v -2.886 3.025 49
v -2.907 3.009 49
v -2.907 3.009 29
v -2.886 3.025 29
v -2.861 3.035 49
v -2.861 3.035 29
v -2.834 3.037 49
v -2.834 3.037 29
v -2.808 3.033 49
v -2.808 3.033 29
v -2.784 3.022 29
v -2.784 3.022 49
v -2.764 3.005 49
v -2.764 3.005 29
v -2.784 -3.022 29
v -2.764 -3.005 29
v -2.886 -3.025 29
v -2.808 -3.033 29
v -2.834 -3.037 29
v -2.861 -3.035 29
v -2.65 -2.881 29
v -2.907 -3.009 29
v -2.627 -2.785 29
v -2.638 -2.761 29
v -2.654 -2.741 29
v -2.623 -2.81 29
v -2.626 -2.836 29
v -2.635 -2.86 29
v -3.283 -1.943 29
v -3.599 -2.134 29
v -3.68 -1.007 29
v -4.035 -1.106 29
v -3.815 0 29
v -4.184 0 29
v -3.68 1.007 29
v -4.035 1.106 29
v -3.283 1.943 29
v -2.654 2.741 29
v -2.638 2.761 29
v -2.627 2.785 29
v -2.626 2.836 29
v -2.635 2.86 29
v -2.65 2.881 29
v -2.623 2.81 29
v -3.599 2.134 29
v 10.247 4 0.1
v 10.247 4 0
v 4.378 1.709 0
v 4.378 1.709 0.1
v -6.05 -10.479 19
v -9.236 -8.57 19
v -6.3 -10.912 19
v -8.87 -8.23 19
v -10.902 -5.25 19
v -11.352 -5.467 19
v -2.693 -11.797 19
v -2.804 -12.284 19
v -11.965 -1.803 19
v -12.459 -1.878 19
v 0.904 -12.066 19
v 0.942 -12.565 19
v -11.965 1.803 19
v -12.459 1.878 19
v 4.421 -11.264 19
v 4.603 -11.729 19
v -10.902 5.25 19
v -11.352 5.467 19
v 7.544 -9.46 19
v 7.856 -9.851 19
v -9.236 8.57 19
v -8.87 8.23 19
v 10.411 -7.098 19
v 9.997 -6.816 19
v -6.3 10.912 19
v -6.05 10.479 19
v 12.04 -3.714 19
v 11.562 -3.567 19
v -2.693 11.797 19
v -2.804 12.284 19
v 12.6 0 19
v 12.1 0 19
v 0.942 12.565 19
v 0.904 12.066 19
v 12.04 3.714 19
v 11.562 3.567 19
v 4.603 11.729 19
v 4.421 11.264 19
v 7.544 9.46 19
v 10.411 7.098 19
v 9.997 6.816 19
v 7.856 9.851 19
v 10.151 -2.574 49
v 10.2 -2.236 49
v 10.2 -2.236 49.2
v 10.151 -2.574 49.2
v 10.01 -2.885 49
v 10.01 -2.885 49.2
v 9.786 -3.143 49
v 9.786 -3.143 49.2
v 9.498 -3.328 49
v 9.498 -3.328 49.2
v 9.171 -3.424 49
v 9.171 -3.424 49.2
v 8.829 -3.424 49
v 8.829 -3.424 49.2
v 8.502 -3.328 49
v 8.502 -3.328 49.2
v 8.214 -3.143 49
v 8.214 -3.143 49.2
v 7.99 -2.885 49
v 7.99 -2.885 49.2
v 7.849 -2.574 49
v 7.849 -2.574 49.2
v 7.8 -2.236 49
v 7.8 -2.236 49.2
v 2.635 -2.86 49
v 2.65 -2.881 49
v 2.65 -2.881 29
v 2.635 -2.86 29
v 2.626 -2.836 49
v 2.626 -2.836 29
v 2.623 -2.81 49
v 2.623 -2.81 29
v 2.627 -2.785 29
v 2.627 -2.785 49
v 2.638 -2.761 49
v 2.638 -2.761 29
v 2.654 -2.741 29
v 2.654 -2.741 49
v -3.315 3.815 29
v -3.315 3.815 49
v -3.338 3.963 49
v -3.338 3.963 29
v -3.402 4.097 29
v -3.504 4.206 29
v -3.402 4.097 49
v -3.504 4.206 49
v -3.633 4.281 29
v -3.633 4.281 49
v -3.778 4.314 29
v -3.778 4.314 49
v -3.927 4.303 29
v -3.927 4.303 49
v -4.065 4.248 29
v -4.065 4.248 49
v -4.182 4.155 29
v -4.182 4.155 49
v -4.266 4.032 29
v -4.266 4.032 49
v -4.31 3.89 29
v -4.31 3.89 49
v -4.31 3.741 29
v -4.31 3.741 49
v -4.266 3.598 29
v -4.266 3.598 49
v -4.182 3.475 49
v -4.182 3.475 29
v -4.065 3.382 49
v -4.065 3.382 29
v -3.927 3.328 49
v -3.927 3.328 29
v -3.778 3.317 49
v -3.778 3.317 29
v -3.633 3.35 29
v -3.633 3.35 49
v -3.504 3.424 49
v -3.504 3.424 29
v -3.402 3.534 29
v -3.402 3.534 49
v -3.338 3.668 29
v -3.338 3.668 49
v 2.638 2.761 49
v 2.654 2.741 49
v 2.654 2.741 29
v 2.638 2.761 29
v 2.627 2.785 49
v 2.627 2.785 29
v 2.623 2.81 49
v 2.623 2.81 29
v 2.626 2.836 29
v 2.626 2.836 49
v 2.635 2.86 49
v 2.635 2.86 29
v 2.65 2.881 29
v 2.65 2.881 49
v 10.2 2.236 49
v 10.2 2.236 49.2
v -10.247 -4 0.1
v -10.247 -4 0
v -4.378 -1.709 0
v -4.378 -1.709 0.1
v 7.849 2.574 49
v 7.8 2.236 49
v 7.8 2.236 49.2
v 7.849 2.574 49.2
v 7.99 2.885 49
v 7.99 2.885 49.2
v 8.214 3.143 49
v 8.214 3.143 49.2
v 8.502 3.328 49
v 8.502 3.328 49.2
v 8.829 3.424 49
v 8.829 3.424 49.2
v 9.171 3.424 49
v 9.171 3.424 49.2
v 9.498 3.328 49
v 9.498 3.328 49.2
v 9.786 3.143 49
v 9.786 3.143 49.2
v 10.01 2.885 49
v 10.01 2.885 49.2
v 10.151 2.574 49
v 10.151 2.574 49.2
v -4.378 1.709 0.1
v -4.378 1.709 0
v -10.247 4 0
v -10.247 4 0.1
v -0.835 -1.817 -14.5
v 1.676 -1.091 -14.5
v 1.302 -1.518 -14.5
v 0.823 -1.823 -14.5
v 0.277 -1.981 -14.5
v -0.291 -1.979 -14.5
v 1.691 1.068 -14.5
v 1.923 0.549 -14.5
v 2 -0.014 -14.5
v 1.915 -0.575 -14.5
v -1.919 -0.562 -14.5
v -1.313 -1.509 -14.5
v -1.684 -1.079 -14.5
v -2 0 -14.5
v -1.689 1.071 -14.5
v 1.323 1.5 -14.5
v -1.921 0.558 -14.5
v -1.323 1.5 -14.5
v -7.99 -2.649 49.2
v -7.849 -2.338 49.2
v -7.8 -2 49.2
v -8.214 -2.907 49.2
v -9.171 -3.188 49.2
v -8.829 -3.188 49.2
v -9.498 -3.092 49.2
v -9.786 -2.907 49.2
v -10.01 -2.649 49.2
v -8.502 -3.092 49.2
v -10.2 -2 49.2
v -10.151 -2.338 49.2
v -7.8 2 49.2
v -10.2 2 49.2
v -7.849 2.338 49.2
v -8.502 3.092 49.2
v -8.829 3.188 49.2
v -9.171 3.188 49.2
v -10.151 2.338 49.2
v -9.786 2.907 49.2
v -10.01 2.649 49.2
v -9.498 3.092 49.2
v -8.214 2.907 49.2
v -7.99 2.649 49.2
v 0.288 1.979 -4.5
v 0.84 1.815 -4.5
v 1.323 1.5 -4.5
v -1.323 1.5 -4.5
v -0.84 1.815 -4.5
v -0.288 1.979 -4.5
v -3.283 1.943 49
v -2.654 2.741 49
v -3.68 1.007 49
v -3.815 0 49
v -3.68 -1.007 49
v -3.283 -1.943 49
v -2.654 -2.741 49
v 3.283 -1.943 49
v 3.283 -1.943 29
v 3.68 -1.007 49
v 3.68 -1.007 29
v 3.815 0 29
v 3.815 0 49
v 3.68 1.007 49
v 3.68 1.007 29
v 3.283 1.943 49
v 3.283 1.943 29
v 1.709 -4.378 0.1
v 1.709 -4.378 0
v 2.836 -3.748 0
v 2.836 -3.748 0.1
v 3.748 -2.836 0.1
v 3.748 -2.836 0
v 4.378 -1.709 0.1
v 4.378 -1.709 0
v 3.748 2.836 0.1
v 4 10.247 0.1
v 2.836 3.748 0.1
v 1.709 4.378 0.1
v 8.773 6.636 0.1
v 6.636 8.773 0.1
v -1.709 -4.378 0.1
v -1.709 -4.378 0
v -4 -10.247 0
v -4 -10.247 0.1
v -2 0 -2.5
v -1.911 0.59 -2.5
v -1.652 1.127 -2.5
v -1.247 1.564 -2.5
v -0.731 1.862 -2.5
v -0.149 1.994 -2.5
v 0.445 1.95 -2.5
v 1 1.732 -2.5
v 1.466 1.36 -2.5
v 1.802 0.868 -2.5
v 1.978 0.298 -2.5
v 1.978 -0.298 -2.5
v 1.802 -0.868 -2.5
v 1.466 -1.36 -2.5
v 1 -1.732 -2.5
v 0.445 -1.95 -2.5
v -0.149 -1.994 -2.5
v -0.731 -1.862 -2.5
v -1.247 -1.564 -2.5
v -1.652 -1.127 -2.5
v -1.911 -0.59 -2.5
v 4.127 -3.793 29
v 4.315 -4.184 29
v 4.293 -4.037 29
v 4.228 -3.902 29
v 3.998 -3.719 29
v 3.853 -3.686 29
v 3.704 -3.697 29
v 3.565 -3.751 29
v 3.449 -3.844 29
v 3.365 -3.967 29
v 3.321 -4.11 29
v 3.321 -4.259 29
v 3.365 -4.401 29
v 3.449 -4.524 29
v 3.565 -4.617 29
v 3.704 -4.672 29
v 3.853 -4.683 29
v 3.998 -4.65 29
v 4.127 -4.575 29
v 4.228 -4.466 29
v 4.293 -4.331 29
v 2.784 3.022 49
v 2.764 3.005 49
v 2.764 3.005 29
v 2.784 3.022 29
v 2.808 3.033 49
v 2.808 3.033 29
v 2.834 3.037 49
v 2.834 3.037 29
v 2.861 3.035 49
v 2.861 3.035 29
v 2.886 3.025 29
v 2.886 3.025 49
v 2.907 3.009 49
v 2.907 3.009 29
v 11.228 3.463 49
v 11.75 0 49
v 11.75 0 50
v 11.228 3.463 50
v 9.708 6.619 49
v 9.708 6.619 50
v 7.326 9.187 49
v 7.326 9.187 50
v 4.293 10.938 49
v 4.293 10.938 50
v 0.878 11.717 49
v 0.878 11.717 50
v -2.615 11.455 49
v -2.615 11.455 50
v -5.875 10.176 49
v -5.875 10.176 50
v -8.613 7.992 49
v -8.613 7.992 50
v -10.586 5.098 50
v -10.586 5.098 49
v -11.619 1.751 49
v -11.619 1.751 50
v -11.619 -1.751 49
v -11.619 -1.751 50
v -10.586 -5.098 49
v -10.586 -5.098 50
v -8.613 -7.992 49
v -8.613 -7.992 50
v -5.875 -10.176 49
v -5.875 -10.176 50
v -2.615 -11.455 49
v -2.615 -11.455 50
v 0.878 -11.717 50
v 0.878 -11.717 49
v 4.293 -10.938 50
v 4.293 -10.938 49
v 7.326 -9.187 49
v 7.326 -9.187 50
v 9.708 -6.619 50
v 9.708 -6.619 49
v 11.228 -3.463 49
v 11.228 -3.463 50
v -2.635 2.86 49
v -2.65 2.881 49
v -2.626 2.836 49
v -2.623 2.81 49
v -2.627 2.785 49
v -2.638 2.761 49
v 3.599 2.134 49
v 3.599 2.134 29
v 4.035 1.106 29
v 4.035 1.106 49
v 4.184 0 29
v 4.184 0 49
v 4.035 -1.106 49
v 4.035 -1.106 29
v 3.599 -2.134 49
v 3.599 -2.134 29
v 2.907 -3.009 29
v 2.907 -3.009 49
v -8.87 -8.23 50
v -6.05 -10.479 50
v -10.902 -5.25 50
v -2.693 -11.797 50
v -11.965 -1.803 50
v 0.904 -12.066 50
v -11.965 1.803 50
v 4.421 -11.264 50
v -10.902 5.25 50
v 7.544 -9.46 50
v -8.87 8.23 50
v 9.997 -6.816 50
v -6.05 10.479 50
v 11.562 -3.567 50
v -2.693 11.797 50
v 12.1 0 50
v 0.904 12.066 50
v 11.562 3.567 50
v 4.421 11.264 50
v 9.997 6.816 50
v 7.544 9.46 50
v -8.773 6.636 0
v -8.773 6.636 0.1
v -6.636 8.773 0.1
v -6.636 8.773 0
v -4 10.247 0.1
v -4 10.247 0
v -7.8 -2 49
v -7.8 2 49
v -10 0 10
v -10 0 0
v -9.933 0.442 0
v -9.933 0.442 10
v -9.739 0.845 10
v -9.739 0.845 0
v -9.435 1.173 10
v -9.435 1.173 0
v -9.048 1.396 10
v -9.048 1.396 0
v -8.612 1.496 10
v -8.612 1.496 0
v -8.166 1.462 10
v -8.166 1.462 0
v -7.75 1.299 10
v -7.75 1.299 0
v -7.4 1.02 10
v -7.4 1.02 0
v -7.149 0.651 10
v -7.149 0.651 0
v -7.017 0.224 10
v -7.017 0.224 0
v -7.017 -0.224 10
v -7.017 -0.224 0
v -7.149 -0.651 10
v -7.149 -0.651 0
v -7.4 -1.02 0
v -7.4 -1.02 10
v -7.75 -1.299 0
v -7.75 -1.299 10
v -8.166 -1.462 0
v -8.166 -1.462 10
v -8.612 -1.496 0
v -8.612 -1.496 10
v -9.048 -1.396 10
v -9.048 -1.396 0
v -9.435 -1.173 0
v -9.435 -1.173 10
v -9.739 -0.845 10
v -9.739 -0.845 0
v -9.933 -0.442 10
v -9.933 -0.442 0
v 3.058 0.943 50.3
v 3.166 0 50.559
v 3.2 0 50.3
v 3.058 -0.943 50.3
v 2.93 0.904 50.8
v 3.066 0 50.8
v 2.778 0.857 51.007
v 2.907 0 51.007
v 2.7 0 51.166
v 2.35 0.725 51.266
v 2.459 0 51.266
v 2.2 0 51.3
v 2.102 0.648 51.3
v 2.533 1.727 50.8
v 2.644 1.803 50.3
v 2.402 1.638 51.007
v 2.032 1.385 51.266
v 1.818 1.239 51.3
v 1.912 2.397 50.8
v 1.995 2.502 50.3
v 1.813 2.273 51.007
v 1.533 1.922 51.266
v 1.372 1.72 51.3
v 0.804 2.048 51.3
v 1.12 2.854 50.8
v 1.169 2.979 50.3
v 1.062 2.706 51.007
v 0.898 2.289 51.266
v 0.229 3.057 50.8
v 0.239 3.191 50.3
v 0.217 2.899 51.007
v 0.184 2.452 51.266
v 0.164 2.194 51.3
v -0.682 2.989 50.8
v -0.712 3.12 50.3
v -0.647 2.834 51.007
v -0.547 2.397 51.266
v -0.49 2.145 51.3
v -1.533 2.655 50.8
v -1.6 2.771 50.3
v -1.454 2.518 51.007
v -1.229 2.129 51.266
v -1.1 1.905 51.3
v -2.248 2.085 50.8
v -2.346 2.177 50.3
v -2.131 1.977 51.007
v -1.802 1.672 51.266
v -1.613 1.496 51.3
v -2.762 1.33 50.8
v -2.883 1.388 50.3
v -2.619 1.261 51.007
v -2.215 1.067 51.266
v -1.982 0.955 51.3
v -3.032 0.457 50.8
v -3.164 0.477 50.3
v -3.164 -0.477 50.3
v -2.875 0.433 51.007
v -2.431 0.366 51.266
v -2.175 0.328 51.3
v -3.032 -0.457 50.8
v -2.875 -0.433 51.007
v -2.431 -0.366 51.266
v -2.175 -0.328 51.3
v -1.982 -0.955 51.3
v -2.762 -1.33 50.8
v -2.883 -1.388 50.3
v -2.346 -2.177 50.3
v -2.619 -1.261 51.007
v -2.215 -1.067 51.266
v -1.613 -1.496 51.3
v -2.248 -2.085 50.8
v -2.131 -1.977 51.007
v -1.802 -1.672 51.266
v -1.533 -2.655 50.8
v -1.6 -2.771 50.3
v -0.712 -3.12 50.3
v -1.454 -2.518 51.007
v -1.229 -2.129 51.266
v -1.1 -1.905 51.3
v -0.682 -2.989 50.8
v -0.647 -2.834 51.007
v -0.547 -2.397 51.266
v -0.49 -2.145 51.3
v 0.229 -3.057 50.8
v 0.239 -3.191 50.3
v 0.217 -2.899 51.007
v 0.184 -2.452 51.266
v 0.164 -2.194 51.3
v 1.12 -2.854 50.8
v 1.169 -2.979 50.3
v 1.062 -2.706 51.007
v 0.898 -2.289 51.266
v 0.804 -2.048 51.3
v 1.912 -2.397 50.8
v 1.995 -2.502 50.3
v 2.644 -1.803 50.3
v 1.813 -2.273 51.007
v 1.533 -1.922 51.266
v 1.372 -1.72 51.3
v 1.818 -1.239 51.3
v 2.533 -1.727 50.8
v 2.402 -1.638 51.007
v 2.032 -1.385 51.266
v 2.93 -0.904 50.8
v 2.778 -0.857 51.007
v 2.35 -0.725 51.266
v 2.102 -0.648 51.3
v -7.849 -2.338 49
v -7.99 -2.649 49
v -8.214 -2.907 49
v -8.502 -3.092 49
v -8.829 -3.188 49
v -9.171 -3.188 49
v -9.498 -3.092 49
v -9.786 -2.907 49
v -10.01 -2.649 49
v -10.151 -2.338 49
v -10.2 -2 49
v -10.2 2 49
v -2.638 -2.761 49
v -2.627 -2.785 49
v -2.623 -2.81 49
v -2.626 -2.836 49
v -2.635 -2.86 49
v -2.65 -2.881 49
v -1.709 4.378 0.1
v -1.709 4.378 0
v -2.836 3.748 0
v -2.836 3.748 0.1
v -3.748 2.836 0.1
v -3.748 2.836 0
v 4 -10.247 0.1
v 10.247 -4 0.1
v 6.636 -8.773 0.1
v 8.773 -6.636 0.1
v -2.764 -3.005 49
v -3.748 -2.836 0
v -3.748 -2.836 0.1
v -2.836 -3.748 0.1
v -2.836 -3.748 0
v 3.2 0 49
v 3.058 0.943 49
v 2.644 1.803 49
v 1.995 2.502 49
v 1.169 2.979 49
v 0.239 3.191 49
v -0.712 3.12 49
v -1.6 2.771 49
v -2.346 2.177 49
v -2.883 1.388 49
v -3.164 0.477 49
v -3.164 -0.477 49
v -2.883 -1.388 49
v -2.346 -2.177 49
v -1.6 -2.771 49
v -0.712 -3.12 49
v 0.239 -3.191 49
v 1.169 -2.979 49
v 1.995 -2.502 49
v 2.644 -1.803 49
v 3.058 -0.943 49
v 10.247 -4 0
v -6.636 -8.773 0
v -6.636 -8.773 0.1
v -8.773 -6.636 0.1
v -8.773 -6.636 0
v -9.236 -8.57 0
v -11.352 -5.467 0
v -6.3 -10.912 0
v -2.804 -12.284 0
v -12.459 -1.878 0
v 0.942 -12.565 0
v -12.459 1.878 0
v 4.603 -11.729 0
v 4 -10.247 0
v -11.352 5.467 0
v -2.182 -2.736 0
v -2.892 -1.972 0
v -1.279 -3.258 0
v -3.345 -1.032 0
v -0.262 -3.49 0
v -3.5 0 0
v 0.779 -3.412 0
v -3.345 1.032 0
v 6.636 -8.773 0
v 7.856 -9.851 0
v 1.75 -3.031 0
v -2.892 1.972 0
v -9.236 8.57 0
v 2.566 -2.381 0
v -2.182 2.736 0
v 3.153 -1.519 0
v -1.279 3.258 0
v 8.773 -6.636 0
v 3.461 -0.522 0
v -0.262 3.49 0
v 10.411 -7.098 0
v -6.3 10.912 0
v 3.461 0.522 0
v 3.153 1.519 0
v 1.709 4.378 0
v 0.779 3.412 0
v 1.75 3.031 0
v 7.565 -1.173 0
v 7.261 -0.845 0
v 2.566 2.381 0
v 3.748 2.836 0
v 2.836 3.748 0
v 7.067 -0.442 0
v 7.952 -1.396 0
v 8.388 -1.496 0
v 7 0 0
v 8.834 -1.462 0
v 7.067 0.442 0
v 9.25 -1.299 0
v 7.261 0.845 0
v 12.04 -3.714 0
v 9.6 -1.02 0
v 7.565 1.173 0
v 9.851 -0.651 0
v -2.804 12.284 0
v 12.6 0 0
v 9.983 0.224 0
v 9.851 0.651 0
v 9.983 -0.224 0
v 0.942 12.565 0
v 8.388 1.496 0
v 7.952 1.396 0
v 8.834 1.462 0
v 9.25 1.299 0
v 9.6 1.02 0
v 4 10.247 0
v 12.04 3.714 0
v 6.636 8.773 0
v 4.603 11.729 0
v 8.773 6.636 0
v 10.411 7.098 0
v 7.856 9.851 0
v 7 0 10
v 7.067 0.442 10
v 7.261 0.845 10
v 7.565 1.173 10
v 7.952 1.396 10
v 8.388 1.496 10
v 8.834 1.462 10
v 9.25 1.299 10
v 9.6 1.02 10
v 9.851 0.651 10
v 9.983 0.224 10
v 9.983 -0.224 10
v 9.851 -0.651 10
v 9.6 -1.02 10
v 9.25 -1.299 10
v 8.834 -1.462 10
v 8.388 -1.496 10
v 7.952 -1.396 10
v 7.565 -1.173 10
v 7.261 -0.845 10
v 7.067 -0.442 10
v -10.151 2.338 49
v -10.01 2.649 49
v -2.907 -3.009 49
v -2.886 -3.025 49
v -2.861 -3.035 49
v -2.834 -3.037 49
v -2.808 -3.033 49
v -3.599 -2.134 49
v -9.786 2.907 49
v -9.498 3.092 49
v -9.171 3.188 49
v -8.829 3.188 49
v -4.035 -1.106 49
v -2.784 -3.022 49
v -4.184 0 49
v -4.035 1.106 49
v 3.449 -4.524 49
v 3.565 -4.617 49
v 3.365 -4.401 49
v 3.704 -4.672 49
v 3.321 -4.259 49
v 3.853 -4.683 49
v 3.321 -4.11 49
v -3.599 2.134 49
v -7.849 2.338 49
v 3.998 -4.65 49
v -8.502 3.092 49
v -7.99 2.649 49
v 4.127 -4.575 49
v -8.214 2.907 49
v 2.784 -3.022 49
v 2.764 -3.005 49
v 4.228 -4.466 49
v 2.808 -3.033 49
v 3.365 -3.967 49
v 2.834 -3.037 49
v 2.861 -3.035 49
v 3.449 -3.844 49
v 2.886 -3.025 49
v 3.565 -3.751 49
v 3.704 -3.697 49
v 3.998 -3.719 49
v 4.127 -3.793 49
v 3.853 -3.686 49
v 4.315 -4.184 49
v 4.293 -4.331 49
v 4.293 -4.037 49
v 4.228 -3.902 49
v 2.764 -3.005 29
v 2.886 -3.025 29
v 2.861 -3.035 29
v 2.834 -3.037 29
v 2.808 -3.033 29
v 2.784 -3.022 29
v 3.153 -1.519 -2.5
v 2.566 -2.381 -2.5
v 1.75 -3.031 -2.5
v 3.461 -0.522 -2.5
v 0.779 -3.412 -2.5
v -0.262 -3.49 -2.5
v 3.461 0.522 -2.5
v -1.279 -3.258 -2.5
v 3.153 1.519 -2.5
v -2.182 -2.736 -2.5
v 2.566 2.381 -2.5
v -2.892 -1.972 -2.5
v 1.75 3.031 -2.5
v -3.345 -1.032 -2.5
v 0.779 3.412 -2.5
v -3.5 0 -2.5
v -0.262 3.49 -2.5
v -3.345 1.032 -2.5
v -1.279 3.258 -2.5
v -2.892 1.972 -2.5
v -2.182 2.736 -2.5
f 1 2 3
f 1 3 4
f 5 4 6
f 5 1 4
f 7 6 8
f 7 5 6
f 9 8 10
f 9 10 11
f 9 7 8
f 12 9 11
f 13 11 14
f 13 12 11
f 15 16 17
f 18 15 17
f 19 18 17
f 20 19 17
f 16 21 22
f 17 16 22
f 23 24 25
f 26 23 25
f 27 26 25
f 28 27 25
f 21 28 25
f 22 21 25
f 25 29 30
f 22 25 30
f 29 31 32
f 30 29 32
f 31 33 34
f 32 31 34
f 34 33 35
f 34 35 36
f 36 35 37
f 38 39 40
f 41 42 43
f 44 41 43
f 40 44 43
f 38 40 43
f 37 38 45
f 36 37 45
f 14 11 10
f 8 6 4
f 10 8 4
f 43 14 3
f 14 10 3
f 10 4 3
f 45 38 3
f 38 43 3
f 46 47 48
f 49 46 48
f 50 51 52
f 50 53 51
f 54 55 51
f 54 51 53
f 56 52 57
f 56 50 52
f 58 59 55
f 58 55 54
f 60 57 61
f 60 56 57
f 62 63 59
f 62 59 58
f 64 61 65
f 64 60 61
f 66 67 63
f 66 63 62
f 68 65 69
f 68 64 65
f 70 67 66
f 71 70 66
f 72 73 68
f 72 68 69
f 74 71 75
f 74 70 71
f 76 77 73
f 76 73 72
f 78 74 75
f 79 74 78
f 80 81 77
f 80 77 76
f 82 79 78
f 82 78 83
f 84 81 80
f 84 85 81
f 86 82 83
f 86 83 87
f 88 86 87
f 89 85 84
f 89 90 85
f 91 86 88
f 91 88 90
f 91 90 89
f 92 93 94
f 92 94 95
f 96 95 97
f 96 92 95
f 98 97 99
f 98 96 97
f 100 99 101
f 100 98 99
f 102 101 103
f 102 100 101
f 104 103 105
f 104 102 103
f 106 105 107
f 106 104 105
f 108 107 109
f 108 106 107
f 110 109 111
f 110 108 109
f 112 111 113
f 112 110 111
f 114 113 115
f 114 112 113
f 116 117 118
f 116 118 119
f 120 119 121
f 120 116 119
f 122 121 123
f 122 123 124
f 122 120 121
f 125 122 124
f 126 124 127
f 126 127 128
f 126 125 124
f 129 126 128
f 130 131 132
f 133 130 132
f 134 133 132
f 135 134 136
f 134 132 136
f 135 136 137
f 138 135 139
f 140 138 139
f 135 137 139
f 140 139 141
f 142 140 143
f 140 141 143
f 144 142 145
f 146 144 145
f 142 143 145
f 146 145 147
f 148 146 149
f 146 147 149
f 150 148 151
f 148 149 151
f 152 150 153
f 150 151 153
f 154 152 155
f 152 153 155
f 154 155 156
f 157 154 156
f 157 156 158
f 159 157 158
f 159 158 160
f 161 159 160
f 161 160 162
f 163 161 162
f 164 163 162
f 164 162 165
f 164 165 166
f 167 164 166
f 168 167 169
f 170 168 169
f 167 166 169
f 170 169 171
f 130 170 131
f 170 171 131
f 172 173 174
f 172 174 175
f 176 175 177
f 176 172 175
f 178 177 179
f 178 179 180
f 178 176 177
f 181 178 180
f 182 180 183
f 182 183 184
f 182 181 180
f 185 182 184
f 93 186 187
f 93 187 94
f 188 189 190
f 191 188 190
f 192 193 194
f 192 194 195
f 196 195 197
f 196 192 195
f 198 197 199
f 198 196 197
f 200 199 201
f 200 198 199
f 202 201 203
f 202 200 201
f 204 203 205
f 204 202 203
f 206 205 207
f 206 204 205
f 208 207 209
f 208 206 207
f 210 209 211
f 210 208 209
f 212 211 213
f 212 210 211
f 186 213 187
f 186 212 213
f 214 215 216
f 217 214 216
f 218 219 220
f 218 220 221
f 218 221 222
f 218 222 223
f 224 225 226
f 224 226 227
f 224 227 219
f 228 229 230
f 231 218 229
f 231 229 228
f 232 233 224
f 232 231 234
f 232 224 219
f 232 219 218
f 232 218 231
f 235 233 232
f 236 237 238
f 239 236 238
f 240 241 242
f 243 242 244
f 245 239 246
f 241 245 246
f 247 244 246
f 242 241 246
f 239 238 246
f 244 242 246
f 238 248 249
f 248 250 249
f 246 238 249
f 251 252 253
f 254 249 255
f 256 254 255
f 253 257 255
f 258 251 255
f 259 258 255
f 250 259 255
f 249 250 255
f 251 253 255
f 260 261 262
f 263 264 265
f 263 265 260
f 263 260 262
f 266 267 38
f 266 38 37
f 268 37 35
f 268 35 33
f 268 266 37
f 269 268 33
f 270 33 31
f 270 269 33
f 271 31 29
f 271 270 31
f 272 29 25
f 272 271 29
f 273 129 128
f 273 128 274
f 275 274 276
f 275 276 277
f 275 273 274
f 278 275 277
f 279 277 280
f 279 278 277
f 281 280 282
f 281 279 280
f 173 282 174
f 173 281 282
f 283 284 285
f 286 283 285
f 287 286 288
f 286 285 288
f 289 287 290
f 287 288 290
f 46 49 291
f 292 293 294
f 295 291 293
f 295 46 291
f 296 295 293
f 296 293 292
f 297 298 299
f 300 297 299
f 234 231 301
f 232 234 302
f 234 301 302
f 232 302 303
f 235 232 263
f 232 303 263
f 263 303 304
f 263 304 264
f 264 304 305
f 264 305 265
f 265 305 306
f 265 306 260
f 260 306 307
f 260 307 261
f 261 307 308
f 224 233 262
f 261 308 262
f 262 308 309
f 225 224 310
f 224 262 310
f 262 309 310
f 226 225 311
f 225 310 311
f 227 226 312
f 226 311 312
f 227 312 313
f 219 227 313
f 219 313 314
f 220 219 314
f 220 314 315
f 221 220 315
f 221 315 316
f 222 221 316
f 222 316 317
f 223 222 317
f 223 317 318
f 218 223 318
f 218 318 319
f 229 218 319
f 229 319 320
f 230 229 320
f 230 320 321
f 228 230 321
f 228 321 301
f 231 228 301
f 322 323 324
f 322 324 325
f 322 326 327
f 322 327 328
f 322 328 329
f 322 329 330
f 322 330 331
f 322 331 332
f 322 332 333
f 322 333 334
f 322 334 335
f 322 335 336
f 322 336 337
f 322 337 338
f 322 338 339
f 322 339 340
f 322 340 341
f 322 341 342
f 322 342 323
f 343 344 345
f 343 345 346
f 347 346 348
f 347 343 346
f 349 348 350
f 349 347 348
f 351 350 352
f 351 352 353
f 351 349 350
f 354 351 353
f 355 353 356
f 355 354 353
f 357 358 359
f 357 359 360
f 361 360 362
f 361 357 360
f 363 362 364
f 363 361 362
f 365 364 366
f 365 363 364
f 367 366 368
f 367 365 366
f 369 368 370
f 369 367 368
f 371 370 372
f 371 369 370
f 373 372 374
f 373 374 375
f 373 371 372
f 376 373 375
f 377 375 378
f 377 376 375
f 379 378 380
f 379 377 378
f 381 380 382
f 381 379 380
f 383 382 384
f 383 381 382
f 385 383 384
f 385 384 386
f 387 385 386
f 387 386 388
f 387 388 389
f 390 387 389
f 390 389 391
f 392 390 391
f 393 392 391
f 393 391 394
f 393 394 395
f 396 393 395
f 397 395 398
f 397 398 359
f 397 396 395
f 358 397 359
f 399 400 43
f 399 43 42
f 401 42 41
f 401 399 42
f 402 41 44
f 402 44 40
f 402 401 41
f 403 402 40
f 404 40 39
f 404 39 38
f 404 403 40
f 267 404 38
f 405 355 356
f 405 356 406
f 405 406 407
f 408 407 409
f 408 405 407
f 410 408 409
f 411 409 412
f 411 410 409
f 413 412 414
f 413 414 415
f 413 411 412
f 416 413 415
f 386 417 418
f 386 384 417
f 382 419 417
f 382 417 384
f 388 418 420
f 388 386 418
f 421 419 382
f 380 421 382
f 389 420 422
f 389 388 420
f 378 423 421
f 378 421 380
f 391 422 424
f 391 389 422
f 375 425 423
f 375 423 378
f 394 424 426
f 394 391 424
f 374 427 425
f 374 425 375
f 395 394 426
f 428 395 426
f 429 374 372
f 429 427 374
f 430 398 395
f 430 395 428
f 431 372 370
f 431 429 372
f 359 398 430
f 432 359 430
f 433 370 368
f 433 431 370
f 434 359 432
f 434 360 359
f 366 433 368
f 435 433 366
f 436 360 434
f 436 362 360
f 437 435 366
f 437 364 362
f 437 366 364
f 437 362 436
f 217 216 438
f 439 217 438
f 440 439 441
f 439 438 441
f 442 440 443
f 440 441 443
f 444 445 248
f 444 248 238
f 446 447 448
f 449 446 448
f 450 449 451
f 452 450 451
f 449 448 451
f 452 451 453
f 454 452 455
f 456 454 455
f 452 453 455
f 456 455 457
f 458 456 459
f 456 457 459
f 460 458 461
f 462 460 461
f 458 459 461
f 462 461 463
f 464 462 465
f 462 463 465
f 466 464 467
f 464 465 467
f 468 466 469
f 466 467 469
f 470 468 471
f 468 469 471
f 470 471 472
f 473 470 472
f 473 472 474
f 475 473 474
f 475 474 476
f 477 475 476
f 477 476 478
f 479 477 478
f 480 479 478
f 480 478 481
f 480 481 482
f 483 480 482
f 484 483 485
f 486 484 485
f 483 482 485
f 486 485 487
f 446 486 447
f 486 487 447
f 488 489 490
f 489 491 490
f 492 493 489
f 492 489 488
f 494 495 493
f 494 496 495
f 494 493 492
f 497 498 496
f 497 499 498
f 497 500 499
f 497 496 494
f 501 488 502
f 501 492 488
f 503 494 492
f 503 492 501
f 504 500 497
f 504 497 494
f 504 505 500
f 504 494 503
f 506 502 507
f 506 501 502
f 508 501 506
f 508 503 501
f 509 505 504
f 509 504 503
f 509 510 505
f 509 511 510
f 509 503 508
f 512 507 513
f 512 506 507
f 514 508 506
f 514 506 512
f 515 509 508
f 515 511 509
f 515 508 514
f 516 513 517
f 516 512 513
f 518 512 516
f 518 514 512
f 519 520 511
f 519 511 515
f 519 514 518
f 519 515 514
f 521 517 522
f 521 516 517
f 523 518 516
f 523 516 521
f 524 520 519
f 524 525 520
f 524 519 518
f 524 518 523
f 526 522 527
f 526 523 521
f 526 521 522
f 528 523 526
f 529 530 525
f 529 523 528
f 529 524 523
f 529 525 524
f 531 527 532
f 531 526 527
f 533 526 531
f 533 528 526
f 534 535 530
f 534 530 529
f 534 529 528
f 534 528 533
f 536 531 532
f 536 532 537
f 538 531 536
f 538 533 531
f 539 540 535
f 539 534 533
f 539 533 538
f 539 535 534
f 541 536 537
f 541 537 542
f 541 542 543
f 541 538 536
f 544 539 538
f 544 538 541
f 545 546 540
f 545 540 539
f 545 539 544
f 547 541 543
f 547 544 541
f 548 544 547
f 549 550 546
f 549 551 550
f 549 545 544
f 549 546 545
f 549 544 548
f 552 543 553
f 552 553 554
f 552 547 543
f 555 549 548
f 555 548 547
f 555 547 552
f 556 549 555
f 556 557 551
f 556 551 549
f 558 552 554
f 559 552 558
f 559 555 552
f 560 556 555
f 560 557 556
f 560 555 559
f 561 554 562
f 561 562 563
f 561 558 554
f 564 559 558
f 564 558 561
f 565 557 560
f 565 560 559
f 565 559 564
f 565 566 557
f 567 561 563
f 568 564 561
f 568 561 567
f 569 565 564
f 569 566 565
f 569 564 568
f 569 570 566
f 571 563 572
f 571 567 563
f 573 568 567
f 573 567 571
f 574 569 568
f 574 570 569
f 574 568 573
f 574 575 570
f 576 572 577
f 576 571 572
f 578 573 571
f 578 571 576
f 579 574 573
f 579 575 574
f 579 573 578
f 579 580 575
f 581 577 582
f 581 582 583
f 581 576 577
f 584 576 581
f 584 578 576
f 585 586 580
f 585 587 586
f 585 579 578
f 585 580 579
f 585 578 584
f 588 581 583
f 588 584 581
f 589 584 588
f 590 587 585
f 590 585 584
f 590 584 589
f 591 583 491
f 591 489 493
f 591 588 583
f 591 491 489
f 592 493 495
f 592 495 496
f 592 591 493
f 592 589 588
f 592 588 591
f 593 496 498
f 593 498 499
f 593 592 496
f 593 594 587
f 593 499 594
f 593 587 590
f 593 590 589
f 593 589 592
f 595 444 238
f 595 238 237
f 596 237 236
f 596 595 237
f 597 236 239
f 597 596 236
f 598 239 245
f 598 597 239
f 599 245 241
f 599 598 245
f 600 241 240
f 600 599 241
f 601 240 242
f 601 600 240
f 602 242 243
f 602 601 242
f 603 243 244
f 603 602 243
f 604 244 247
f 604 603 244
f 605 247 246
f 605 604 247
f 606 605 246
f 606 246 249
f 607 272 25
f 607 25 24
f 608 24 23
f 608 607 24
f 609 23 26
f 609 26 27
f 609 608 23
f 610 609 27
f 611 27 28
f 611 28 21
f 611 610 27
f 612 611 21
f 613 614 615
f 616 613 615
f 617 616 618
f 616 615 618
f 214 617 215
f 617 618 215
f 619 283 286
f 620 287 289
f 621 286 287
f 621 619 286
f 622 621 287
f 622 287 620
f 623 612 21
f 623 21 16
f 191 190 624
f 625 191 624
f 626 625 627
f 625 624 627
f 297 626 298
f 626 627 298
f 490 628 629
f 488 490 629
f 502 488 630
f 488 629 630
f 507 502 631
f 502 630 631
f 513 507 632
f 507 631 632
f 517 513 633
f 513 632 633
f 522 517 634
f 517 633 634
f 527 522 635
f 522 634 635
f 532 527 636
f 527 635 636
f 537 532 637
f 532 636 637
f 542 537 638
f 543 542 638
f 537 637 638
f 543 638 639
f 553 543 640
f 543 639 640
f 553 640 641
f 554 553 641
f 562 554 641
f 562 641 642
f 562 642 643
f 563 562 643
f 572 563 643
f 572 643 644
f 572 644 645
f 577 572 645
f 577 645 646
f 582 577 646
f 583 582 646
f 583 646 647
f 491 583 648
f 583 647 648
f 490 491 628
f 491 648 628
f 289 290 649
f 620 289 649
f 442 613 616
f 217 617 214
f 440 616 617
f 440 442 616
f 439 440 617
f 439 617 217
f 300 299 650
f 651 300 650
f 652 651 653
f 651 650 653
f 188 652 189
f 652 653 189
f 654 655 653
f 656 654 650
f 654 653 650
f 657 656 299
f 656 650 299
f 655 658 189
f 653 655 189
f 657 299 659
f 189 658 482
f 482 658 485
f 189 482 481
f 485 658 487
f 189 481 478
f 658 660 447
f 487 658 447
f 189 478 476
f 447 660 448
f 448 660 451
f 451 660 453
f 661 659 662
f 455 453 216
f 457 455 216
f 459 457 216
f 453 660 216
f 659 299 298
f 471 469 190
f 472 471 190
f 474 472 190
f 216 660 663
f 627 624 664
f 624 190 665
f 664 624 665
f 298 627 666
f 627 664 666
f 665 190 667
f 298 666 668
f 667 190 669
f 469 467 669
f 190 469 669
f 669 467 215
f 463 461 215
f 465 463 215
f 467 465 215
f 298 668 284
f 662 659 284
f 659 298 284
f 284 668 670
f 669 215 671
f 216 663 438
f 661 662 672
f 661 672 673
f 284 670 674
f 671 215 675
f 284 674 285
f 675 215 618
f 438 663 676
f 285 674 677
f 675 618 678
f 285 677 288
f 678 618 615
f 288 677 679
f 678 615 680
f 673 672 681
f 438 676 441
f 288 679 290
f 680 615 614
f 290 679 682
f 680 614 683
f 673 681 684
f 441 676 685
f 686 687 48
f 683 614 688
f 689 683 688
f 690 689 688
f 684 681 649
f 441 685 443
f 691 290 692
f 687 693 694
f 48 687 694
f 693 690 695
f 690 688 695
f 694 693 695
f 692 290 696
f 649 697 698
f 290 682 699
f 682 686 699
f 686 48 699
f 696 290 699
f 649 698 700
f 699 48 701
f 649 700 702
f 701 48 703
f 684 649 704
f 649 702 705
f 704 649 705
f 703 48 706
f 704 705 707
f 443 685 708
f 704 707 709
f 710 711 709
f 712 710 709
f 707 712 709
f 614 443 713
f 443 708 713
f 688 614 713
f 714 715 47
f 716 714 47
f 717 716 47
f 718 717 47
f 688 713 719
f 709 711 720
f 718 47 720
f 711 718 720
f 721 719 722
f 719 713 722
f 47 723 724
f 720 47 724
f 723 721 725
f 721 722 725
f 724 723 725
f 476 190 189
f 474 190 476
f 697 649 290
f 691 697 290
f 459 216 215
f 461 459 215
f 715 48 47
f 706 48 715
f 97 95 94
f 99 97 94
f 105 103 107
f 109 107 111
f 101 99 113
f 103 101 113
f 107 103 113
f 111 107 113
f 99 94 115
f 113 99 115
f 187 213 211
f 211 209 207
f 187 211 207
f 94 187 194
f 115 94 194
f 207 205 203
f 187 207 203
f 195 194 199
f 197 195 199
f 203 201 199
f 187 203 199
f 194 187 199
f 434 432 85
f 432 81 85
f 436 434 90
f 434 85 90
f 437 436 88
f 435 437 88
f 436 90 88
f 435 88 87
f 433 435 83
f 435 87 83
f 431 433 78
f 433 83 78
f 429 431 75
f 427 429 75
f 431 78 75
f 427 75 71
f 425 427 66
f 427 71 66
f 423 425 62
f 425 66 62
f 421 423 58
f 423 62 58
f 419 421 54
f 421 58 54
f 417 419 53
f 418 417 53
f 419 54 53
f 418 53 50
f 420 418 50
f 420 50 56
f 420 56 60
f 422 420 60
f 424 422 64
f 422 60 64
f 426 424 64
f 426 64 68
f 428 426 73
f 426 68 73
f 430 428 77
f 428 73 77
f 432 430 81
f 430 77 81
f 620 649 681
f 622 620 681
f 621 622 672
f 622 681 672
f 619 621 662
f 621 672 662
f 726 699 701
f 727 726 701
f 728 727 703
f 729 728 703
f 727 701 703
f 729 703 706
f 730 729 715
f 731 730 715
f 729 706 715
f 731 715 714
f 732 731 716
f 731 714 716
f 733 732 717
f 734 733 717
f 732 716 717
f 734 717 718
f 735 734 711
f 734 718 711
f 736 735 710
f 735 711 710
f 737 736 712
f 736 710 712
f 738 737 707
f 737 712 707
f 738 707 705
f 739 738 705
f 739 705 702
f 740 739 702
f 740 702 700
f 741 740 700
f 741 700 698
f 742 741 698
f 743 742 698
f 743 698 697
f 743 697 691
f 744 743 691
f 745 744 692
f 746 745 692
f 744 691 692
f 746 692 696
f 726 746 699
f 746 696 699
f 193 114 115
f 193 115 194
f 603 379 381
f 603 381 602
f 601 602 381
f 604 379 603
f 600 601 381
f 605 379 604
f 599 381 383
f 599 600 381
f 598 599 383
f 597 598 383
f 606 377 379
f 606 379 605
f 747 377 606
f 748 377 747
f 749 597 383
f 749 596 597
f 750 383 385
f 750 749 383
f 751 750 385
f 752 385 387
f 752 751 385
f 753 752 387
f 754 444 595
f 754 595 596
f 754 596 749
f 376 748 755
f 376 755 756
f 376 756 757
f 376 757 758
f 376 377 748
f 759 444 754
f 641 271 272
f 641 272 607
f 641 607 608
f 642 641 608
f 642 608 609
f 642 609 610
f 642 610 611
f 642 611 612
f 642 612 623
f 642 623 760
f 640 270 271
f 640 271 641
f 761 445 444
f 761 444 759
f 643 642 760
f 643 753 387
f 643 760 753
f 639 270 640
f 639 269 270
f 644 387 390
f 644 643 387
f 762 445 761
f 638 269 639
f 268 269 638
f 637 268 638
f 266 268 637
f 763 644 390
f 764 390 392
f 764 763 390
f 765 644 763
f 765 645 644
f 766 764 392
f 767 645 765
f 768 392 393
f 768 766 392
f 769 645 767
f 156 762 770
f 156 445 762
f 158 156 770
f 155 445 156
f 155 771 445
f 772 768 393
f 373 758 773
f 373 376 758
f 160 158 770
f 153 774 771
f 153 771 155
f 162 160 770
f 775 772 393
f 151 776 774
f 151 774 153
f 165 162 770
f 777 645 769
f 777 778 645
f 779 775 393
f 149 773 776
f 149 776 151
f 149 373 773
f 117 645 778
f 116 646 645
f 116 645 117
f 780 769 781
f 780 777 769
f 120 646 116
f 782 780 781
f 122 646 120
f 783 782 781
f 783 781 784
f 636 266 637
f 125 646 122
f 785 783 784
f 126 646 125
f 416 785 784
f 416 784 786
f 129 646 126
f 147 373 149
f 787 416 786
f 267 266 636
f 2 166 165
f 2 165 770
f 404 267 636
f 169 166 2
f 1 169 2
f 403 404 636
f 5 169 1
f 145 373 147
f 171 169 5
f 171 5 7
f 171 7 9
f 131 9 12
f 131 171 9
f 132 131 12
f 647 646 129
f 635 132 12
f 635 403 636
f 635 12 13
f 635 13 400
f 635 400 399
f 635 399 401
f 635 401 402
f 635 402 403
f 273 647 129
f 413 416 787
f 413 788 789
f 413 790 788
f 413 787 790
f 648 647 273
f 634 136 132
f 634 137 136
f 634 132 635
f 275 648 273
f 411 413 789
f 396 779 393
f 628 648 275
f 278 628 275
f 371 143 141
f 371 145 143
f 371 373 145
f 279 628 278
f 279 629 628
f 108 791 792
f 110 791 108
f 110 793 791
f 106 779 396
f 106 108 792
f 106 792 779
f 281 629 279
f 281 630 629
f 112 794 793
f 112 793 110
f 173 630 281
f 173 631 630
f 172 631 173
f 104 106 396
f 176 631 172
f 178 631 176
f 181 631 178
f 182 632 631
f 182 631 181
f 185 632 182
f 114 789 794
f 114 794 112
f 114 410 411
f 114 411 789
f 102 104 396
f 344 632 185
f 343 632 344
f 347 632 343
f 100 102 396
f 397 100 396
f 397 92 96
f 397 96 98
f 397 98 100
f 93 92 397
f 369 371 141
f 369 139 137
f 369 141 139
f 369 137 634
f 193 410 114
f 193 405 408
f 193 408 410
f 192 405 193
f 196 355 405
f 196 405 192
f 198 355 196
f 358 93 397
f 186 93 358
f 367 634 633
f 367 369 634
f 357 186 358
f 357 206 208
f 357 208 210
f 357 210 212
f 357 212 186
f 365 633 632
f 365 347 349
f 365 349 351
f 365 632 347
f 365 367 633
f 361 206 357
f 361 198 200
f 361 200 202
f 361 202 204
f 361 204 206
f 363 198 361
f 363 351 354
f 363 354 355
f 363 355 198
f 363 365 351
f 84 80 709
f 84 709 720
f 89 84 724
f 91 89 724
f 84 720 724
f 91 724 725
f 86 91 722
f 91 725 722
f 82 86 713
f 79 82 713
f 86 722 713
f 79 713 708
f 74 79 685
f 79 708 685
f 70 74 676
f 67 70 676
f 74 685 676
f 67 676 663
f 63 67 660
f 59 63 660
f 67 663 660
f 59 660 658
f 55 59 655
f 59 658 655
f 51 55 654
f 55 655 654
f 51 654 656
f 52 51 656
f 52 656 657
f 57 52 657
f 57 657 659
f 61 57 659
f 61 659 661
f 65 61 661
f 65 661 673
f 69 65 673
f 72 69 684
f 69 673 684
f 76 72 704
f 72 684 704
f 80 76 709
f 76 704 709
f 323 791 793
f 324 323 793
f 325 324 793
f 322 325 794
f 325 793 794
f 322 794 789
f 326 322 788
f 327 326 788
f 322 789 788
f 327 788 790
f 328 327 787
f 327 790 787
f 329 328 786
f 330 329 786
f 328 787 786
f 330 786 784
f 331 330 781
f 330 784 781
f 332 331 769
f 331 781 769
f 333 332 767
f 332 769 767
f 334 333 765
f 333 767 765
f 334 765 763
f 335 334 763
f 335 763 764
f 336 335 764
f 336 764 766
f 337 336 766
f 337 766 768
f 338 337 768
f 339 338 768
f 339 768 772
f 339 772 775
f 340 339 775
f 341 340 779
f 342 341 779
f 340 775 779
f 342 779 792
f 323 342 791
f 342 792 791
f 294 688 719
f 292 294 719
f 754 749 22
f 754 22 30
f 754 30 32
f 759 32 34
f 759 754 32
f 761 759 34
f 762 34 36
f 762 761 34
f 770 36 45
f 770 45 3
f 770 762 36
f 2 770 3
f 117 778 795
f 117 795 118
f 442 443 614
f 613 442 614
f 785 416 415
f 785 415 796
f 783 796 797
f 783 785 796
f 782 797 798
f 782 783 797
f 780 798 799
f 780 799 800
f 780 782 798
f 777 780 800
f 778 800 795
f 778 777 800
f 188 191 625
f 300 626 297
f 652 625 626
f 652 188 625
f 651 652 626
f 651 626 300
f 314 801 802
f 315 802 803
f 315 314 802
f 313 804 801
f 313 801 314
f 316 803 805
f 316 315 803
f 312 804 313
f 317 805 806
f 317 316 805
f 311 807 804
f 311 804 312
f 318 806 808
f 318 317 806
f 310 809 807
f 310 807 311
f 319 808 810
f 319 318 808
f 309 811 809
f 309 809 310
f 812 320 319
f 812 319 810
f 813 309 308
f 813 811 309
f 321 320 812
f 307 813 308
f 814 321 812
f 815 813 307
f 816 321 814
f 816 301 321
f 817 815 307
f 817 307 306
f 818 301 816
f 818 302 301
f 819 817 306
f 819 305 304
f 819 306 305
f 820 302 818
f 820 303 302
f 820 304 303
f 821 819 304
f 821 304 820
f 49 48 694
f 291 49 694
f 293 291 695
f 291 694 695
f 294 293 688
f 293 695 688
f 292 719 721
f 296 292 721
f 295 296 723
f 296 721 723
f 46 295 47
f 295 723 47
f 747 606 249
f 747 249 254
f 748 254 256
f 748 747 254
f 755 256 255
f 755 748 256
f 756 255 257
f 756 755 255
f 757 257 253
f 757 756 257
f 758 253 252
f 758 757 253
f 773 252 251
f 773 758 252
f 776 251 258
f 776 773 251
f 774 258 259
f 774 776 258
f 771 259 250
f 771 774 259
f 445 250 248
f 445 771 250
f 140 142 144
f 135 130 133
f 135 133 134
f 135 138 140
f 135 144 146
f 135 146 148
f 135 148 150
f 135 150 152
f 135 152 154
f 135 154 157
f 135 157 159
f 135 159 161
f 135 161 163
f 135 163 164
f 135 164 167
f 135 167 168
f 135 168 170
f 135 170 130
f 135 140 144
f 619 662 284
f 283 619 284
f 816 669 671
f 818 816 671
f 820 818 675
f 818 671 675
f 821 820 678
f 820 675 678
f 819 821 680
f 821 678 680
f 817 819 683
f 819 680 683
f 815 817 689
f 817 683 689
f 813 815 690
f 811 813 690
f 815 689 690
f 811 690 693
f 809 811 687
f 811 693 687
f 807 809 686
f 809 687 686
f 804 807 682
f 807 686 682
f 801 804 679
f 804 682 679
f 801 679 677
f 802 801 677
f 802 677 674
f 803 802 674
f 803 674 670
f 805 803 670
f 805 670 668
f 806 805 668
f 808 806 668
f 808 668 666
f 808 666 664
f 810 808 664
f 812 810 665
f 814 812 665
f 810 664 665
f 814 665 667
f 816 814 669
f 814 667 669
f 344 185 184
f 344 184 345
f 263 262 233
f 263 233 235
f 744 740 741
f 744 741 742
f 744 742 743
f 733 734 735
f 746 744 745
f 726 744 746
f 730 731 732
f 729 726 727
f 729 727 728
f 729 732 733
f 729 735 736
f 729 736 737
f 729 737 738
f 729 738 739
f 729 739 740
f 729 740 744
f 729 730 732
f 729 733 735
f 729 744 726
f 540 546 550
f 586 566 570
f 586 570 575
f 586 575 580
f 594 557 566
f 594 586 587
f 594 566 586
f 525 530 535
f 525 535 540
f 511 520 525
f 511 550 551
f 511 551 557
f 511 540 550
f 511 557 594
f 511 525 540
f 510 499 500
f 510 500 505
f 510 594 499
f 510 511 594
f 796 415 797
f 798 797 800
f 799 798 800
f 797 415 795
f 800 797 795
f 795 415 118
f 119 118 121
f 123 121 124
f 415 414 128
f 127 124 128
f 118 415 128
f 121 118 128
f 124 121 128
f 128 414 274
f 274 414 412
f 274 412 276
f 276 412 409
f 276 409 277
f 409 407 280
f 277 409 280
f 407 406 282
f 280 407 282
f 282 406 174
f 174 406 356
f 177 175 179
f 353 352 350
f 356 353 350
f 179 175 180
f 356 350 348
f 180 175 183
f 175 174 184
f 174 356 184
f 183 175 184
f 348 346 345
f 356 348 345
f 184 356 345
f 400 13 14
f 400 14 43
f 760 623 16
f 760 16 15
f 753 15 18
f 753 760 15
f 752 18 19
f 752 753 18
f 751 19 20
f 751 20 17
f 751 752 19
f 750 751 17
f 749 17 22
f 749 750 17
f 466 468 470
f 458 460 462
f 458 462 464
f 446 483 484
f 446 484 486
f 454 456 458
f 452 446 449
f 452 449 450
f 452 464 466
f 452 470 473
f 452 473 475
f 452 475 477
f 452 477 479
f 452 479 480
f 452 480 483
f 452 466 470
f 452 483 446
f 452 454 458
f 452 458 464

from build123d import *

# Parameters (mm, degrees)
SKETCH1_R           = 12.6
BOSS_EXTRUDE1_DEPTH = 19
SKETCH2_R           = 12.1
BOSS_EXTRUDE2_DEPTH = 30
SKETCH3_R           = 12.1
SKETCH3_R_2         = 11.75
BOSS_EXTRUDE3_DEPTH = 1
SKETCH4_R           = 3.2
BOSS_EXTRUDE4_DEPTH = 2.3
FILLET1_R           = 1
BOSS_EXTRUDE5_DEPTH = 0.2
SKETCH6_R           = 0.5
CUT_EXTRUDE1_DEPTH  = 20
CUT_EXTRUDE2_DEPTH  = 0.1
CIRPATTERN1_COUNT   = 4
SKETCH8_R           = 3.5
BOSS_EXTRUDE6_DEPTH = 2.5
SKETCH9_R           = 2
BOSS_EXTRUDE7_DEPTH = 12
CUT_EXTRUDE3_START  = -10
CUT_EXTRUDE3_DEPTH  = 10
SKETCH11_R          = 1.5
CUT_EXTRUDE4_DEPTH  = 10


with BuildPart() as part:
    # Sketch1 → Boss-Extrude1 (new body)
    with BuildSketch(Plane.XY):
        Circle(SKETCH1_R)
    extrude(amount=BOSS_EXTRUDE1_DEPTH)

    # Sketch2 → Boss-Extrude2 (add)
    with BuildSketch(Plane.XY.offset(19)):
        Circle(SKETCH2_R)
    extrude(amount=BOSS_EXTRUDE2_DEPTH)

    # Sketch3 → Boss-Extrude3 (add)
    with BuildSketch(Plane.XY.offset(49)):
        Circle(SKETCH3_R)
        Circle(SKETCH3_R_2, mode=Mode.SUBTRACT)
    extrude(amount=BOSS_EXTRUDE3_DEPTH)

    # Sketch4 → Boss-Extrude4 (add)
    with BuildSketch(Plane.XY.offset(49)):
        Circle(SKETCH4_R)
    extrude(amount=BOSS_EXTRUDE4_DEPTH)

    # Fillet1
    fillet1_edges = [part.edges().sort_by_distance(p)[0] for p in [
        (-3.2, 0, 51.3),
    ]]
    fillet(fillet1_edges, radius=FILLET1_R)

    # Sketch5 → Boss-Extrude5 (add)
    with BuildSketch(Plane.XY.offset(49)):
        with BuildLine():
            Line((-7.8, 2), (-7.8, -2))
            ThreePointArc((-7.8, -2), (-9, -3.2), (-10.2, -2))
            Line((-10.2, -2), (-10.2, 2))
            ThreePointArc((-10.2, 2), (-9, 3.2), (-7.8, 2))
        make_face()
        with BuildLine():
            Line((10.2, 2.236300976), (10.2, -2.236300976))
            ThreePointArc((10.2, -2.236300976), (9, -3.436300976), (7.8, -2.236300976))
            Line((7.8, -2.236300976), (7.8, 2.236300976))
            ThreePointArc((7.8, 2.236300976), (9, 3.436300976), (10.2, 2.236300976))
        make_face()
    extrude(amount=BOSS_EXTRUDE5_DEPTH)

    # Sketch6 → Cut-Extrude1 (cut)
    with BuildSketch(Plane.XY.offset(49)):
        with Locations((-3.815326444, 3.815326444)):
            Circle(SKETCH6_R)
        with Locations((3.815326444, -4.184114524)):
            Circle(SKETCH6_R)
        with BuildLine():
            Line((-2.763844704, 3.00518783), (-2.64955067, 2.880913468))
            ThreePointArc((-2.64955067, 2.880913468), (-2.623197255, 2.81031672), (-2.653603933, 2.741368644))
            ThreePointArc((-2.653603933, 2.741368644), (-3.815326444, 0), (-2.653603933, -2.741368644))
            ThreePointArc((-2.653603933, -2.741368644), (-2.623197255, -2.81031672), (-2.64955067, -2.880913468))
            Line((-2.64955067, -2.880913468), (-2.763844704, -3.00518783))
            ThreePointArc((-2.763844704, -3.00518783), (-2.834492952, -3.037450785), (-2.906924389, -3.00941937))
            ThreePointArc((-2.906924389, -3.00941937), (-4.184114524, 0), (-2.906924389, 3.00941937))
            ThreePointArc((-2.906924389, 3.00941937), (-2.834492952, 3.037450785), (-2.763844704, 3.00518783))
        make_face()
        with BuildLine():
            Line((2.64955067, 2.880913468), (2.763844704, 3.00518783))
            ThreePointArc((2.763844704, 3.00518783), (2.834492952, 3.037450785), (2.906924389, 3.00941937))
            ThreePointArc((2.906924389, 3.00941937), (4.184114524, 0), (2.906924389, -3.00941937))
            ThreePointArc((2.906924389, -3.00941937), (2.834492952, -3.037450785), (2.763844704, -3.00518783))
            Line((2.763844704, -3.00518783), (2.64955067, -2.880913468))
            ThreePointArc((2.64955067, -2.880913468), (2.623197255, -2.81031672), (2.653603933, -2.741368644))
            ThreePointArc((2.653603933, -2.741368644), (3.815326444, 0), (2.653603933, 2.741368644))
            ThreePointArc((2.653603933, 2.741368644), (2.623197255, 2.81031672), (2.64955067, 2.880913468))
        make_face()
    extrude(amount=-CUT_EXTRUDE1_DEPTH, mode=Mode.SUBTRACT)

    # Sketch7 → Cut-Extrude2 (cut)
    with BuildSketch(Plane(origin=(0, 0, 0), x_dir=(-1, 0, 0), z_dir=(0, 0, -1))):
        with BuildLine():
            Line((4, 10.246950766), (1.709090909, 4.3782426))
            ThreePointArc((1.709090909, 4.3782426), (3.323401872, 3.323401872), (4.3782426, 1.709090909))
            Line((4.3782426, 1.709090909), (10.246950766, 4))
            ThreePointArc((10.246950766, 4), (7.778174593, 7.778174593), (4, 10.246950766))
        make_face()
    cut_extrude2 = extrude(amount=-CUT_EXTRUDE2_DEPTH, mode=Mode.SUBTRACT)

    # CirPattern1: Cut-Extrude2 ×4 about axis
    cirpattern1_axis = Axis((0, 0, 0), (0, 0, 1))
    for i in range(1, CIRPATTERN1_COUNT):
        add(cut_extrude2.rotate(cirpattern1_axis, i * 360 / CIRPATTERN1_COUNT), mode=Mode.SUBTRACT)

    # Sketch8 → Boss-Extrude6 (add)
    with BuildSketch(Plane(origin=(0, 0, 0), x_dir=(-1, 0, 0), z_dir=(0, 0, -1))):
        Circle(SKETCH8_R)
    extrude(amount=BOSS_EXTRUDE6_DEPTH)

    # Sketch9 → Boss-Extrude7 (add)
    with BuildSketch(Plane(origin=(0, 0, -2.5), x_dir=(-1, 0, 0), z_dir=(0, 0, -1))):
        Circle(SKETCH9_R)
    extrude(amount=BOSS_EXTRUDE7_DEPTH)

    # Sketch10 → Cut-Extrude3 (cut)
    with BuildSketch(Plane(origin=(0, 0, -14.5), x_dir=(-1, 0, 0), z_dir=(0, 0, -1)).offset(CUT_EXTRUDE3_START)):
        with BuildLine():
            Line((-1.322875656, 1.5), (1.322875656, 1.5))
            ThreePointArc((1.322875656, 1.5), (0, 2), (-1.322875656, 1.5))
        make_face()
    extrude(amount=CUT_EXTRUDE3_DEPTH, mode=Mode.SUBTRACT)

    # Sketch11 → Cut-Extrude4 (cut)
    with BuildSketch(Plane(origin=(0, 0, 0), x_dir=(-1, 0, 0), z_dir=(0, 0, -1))):
        with Locations((-8.5, 0)):
            Circle(SKETCH11_R)
        with Locations((8.5, 0)):
            Circle(SKETCH11_R)
    extrude(amount=-CUT_EXTRUDE4_DEPTH, mode=Mode.SUBTRACT)


solid = part.part
